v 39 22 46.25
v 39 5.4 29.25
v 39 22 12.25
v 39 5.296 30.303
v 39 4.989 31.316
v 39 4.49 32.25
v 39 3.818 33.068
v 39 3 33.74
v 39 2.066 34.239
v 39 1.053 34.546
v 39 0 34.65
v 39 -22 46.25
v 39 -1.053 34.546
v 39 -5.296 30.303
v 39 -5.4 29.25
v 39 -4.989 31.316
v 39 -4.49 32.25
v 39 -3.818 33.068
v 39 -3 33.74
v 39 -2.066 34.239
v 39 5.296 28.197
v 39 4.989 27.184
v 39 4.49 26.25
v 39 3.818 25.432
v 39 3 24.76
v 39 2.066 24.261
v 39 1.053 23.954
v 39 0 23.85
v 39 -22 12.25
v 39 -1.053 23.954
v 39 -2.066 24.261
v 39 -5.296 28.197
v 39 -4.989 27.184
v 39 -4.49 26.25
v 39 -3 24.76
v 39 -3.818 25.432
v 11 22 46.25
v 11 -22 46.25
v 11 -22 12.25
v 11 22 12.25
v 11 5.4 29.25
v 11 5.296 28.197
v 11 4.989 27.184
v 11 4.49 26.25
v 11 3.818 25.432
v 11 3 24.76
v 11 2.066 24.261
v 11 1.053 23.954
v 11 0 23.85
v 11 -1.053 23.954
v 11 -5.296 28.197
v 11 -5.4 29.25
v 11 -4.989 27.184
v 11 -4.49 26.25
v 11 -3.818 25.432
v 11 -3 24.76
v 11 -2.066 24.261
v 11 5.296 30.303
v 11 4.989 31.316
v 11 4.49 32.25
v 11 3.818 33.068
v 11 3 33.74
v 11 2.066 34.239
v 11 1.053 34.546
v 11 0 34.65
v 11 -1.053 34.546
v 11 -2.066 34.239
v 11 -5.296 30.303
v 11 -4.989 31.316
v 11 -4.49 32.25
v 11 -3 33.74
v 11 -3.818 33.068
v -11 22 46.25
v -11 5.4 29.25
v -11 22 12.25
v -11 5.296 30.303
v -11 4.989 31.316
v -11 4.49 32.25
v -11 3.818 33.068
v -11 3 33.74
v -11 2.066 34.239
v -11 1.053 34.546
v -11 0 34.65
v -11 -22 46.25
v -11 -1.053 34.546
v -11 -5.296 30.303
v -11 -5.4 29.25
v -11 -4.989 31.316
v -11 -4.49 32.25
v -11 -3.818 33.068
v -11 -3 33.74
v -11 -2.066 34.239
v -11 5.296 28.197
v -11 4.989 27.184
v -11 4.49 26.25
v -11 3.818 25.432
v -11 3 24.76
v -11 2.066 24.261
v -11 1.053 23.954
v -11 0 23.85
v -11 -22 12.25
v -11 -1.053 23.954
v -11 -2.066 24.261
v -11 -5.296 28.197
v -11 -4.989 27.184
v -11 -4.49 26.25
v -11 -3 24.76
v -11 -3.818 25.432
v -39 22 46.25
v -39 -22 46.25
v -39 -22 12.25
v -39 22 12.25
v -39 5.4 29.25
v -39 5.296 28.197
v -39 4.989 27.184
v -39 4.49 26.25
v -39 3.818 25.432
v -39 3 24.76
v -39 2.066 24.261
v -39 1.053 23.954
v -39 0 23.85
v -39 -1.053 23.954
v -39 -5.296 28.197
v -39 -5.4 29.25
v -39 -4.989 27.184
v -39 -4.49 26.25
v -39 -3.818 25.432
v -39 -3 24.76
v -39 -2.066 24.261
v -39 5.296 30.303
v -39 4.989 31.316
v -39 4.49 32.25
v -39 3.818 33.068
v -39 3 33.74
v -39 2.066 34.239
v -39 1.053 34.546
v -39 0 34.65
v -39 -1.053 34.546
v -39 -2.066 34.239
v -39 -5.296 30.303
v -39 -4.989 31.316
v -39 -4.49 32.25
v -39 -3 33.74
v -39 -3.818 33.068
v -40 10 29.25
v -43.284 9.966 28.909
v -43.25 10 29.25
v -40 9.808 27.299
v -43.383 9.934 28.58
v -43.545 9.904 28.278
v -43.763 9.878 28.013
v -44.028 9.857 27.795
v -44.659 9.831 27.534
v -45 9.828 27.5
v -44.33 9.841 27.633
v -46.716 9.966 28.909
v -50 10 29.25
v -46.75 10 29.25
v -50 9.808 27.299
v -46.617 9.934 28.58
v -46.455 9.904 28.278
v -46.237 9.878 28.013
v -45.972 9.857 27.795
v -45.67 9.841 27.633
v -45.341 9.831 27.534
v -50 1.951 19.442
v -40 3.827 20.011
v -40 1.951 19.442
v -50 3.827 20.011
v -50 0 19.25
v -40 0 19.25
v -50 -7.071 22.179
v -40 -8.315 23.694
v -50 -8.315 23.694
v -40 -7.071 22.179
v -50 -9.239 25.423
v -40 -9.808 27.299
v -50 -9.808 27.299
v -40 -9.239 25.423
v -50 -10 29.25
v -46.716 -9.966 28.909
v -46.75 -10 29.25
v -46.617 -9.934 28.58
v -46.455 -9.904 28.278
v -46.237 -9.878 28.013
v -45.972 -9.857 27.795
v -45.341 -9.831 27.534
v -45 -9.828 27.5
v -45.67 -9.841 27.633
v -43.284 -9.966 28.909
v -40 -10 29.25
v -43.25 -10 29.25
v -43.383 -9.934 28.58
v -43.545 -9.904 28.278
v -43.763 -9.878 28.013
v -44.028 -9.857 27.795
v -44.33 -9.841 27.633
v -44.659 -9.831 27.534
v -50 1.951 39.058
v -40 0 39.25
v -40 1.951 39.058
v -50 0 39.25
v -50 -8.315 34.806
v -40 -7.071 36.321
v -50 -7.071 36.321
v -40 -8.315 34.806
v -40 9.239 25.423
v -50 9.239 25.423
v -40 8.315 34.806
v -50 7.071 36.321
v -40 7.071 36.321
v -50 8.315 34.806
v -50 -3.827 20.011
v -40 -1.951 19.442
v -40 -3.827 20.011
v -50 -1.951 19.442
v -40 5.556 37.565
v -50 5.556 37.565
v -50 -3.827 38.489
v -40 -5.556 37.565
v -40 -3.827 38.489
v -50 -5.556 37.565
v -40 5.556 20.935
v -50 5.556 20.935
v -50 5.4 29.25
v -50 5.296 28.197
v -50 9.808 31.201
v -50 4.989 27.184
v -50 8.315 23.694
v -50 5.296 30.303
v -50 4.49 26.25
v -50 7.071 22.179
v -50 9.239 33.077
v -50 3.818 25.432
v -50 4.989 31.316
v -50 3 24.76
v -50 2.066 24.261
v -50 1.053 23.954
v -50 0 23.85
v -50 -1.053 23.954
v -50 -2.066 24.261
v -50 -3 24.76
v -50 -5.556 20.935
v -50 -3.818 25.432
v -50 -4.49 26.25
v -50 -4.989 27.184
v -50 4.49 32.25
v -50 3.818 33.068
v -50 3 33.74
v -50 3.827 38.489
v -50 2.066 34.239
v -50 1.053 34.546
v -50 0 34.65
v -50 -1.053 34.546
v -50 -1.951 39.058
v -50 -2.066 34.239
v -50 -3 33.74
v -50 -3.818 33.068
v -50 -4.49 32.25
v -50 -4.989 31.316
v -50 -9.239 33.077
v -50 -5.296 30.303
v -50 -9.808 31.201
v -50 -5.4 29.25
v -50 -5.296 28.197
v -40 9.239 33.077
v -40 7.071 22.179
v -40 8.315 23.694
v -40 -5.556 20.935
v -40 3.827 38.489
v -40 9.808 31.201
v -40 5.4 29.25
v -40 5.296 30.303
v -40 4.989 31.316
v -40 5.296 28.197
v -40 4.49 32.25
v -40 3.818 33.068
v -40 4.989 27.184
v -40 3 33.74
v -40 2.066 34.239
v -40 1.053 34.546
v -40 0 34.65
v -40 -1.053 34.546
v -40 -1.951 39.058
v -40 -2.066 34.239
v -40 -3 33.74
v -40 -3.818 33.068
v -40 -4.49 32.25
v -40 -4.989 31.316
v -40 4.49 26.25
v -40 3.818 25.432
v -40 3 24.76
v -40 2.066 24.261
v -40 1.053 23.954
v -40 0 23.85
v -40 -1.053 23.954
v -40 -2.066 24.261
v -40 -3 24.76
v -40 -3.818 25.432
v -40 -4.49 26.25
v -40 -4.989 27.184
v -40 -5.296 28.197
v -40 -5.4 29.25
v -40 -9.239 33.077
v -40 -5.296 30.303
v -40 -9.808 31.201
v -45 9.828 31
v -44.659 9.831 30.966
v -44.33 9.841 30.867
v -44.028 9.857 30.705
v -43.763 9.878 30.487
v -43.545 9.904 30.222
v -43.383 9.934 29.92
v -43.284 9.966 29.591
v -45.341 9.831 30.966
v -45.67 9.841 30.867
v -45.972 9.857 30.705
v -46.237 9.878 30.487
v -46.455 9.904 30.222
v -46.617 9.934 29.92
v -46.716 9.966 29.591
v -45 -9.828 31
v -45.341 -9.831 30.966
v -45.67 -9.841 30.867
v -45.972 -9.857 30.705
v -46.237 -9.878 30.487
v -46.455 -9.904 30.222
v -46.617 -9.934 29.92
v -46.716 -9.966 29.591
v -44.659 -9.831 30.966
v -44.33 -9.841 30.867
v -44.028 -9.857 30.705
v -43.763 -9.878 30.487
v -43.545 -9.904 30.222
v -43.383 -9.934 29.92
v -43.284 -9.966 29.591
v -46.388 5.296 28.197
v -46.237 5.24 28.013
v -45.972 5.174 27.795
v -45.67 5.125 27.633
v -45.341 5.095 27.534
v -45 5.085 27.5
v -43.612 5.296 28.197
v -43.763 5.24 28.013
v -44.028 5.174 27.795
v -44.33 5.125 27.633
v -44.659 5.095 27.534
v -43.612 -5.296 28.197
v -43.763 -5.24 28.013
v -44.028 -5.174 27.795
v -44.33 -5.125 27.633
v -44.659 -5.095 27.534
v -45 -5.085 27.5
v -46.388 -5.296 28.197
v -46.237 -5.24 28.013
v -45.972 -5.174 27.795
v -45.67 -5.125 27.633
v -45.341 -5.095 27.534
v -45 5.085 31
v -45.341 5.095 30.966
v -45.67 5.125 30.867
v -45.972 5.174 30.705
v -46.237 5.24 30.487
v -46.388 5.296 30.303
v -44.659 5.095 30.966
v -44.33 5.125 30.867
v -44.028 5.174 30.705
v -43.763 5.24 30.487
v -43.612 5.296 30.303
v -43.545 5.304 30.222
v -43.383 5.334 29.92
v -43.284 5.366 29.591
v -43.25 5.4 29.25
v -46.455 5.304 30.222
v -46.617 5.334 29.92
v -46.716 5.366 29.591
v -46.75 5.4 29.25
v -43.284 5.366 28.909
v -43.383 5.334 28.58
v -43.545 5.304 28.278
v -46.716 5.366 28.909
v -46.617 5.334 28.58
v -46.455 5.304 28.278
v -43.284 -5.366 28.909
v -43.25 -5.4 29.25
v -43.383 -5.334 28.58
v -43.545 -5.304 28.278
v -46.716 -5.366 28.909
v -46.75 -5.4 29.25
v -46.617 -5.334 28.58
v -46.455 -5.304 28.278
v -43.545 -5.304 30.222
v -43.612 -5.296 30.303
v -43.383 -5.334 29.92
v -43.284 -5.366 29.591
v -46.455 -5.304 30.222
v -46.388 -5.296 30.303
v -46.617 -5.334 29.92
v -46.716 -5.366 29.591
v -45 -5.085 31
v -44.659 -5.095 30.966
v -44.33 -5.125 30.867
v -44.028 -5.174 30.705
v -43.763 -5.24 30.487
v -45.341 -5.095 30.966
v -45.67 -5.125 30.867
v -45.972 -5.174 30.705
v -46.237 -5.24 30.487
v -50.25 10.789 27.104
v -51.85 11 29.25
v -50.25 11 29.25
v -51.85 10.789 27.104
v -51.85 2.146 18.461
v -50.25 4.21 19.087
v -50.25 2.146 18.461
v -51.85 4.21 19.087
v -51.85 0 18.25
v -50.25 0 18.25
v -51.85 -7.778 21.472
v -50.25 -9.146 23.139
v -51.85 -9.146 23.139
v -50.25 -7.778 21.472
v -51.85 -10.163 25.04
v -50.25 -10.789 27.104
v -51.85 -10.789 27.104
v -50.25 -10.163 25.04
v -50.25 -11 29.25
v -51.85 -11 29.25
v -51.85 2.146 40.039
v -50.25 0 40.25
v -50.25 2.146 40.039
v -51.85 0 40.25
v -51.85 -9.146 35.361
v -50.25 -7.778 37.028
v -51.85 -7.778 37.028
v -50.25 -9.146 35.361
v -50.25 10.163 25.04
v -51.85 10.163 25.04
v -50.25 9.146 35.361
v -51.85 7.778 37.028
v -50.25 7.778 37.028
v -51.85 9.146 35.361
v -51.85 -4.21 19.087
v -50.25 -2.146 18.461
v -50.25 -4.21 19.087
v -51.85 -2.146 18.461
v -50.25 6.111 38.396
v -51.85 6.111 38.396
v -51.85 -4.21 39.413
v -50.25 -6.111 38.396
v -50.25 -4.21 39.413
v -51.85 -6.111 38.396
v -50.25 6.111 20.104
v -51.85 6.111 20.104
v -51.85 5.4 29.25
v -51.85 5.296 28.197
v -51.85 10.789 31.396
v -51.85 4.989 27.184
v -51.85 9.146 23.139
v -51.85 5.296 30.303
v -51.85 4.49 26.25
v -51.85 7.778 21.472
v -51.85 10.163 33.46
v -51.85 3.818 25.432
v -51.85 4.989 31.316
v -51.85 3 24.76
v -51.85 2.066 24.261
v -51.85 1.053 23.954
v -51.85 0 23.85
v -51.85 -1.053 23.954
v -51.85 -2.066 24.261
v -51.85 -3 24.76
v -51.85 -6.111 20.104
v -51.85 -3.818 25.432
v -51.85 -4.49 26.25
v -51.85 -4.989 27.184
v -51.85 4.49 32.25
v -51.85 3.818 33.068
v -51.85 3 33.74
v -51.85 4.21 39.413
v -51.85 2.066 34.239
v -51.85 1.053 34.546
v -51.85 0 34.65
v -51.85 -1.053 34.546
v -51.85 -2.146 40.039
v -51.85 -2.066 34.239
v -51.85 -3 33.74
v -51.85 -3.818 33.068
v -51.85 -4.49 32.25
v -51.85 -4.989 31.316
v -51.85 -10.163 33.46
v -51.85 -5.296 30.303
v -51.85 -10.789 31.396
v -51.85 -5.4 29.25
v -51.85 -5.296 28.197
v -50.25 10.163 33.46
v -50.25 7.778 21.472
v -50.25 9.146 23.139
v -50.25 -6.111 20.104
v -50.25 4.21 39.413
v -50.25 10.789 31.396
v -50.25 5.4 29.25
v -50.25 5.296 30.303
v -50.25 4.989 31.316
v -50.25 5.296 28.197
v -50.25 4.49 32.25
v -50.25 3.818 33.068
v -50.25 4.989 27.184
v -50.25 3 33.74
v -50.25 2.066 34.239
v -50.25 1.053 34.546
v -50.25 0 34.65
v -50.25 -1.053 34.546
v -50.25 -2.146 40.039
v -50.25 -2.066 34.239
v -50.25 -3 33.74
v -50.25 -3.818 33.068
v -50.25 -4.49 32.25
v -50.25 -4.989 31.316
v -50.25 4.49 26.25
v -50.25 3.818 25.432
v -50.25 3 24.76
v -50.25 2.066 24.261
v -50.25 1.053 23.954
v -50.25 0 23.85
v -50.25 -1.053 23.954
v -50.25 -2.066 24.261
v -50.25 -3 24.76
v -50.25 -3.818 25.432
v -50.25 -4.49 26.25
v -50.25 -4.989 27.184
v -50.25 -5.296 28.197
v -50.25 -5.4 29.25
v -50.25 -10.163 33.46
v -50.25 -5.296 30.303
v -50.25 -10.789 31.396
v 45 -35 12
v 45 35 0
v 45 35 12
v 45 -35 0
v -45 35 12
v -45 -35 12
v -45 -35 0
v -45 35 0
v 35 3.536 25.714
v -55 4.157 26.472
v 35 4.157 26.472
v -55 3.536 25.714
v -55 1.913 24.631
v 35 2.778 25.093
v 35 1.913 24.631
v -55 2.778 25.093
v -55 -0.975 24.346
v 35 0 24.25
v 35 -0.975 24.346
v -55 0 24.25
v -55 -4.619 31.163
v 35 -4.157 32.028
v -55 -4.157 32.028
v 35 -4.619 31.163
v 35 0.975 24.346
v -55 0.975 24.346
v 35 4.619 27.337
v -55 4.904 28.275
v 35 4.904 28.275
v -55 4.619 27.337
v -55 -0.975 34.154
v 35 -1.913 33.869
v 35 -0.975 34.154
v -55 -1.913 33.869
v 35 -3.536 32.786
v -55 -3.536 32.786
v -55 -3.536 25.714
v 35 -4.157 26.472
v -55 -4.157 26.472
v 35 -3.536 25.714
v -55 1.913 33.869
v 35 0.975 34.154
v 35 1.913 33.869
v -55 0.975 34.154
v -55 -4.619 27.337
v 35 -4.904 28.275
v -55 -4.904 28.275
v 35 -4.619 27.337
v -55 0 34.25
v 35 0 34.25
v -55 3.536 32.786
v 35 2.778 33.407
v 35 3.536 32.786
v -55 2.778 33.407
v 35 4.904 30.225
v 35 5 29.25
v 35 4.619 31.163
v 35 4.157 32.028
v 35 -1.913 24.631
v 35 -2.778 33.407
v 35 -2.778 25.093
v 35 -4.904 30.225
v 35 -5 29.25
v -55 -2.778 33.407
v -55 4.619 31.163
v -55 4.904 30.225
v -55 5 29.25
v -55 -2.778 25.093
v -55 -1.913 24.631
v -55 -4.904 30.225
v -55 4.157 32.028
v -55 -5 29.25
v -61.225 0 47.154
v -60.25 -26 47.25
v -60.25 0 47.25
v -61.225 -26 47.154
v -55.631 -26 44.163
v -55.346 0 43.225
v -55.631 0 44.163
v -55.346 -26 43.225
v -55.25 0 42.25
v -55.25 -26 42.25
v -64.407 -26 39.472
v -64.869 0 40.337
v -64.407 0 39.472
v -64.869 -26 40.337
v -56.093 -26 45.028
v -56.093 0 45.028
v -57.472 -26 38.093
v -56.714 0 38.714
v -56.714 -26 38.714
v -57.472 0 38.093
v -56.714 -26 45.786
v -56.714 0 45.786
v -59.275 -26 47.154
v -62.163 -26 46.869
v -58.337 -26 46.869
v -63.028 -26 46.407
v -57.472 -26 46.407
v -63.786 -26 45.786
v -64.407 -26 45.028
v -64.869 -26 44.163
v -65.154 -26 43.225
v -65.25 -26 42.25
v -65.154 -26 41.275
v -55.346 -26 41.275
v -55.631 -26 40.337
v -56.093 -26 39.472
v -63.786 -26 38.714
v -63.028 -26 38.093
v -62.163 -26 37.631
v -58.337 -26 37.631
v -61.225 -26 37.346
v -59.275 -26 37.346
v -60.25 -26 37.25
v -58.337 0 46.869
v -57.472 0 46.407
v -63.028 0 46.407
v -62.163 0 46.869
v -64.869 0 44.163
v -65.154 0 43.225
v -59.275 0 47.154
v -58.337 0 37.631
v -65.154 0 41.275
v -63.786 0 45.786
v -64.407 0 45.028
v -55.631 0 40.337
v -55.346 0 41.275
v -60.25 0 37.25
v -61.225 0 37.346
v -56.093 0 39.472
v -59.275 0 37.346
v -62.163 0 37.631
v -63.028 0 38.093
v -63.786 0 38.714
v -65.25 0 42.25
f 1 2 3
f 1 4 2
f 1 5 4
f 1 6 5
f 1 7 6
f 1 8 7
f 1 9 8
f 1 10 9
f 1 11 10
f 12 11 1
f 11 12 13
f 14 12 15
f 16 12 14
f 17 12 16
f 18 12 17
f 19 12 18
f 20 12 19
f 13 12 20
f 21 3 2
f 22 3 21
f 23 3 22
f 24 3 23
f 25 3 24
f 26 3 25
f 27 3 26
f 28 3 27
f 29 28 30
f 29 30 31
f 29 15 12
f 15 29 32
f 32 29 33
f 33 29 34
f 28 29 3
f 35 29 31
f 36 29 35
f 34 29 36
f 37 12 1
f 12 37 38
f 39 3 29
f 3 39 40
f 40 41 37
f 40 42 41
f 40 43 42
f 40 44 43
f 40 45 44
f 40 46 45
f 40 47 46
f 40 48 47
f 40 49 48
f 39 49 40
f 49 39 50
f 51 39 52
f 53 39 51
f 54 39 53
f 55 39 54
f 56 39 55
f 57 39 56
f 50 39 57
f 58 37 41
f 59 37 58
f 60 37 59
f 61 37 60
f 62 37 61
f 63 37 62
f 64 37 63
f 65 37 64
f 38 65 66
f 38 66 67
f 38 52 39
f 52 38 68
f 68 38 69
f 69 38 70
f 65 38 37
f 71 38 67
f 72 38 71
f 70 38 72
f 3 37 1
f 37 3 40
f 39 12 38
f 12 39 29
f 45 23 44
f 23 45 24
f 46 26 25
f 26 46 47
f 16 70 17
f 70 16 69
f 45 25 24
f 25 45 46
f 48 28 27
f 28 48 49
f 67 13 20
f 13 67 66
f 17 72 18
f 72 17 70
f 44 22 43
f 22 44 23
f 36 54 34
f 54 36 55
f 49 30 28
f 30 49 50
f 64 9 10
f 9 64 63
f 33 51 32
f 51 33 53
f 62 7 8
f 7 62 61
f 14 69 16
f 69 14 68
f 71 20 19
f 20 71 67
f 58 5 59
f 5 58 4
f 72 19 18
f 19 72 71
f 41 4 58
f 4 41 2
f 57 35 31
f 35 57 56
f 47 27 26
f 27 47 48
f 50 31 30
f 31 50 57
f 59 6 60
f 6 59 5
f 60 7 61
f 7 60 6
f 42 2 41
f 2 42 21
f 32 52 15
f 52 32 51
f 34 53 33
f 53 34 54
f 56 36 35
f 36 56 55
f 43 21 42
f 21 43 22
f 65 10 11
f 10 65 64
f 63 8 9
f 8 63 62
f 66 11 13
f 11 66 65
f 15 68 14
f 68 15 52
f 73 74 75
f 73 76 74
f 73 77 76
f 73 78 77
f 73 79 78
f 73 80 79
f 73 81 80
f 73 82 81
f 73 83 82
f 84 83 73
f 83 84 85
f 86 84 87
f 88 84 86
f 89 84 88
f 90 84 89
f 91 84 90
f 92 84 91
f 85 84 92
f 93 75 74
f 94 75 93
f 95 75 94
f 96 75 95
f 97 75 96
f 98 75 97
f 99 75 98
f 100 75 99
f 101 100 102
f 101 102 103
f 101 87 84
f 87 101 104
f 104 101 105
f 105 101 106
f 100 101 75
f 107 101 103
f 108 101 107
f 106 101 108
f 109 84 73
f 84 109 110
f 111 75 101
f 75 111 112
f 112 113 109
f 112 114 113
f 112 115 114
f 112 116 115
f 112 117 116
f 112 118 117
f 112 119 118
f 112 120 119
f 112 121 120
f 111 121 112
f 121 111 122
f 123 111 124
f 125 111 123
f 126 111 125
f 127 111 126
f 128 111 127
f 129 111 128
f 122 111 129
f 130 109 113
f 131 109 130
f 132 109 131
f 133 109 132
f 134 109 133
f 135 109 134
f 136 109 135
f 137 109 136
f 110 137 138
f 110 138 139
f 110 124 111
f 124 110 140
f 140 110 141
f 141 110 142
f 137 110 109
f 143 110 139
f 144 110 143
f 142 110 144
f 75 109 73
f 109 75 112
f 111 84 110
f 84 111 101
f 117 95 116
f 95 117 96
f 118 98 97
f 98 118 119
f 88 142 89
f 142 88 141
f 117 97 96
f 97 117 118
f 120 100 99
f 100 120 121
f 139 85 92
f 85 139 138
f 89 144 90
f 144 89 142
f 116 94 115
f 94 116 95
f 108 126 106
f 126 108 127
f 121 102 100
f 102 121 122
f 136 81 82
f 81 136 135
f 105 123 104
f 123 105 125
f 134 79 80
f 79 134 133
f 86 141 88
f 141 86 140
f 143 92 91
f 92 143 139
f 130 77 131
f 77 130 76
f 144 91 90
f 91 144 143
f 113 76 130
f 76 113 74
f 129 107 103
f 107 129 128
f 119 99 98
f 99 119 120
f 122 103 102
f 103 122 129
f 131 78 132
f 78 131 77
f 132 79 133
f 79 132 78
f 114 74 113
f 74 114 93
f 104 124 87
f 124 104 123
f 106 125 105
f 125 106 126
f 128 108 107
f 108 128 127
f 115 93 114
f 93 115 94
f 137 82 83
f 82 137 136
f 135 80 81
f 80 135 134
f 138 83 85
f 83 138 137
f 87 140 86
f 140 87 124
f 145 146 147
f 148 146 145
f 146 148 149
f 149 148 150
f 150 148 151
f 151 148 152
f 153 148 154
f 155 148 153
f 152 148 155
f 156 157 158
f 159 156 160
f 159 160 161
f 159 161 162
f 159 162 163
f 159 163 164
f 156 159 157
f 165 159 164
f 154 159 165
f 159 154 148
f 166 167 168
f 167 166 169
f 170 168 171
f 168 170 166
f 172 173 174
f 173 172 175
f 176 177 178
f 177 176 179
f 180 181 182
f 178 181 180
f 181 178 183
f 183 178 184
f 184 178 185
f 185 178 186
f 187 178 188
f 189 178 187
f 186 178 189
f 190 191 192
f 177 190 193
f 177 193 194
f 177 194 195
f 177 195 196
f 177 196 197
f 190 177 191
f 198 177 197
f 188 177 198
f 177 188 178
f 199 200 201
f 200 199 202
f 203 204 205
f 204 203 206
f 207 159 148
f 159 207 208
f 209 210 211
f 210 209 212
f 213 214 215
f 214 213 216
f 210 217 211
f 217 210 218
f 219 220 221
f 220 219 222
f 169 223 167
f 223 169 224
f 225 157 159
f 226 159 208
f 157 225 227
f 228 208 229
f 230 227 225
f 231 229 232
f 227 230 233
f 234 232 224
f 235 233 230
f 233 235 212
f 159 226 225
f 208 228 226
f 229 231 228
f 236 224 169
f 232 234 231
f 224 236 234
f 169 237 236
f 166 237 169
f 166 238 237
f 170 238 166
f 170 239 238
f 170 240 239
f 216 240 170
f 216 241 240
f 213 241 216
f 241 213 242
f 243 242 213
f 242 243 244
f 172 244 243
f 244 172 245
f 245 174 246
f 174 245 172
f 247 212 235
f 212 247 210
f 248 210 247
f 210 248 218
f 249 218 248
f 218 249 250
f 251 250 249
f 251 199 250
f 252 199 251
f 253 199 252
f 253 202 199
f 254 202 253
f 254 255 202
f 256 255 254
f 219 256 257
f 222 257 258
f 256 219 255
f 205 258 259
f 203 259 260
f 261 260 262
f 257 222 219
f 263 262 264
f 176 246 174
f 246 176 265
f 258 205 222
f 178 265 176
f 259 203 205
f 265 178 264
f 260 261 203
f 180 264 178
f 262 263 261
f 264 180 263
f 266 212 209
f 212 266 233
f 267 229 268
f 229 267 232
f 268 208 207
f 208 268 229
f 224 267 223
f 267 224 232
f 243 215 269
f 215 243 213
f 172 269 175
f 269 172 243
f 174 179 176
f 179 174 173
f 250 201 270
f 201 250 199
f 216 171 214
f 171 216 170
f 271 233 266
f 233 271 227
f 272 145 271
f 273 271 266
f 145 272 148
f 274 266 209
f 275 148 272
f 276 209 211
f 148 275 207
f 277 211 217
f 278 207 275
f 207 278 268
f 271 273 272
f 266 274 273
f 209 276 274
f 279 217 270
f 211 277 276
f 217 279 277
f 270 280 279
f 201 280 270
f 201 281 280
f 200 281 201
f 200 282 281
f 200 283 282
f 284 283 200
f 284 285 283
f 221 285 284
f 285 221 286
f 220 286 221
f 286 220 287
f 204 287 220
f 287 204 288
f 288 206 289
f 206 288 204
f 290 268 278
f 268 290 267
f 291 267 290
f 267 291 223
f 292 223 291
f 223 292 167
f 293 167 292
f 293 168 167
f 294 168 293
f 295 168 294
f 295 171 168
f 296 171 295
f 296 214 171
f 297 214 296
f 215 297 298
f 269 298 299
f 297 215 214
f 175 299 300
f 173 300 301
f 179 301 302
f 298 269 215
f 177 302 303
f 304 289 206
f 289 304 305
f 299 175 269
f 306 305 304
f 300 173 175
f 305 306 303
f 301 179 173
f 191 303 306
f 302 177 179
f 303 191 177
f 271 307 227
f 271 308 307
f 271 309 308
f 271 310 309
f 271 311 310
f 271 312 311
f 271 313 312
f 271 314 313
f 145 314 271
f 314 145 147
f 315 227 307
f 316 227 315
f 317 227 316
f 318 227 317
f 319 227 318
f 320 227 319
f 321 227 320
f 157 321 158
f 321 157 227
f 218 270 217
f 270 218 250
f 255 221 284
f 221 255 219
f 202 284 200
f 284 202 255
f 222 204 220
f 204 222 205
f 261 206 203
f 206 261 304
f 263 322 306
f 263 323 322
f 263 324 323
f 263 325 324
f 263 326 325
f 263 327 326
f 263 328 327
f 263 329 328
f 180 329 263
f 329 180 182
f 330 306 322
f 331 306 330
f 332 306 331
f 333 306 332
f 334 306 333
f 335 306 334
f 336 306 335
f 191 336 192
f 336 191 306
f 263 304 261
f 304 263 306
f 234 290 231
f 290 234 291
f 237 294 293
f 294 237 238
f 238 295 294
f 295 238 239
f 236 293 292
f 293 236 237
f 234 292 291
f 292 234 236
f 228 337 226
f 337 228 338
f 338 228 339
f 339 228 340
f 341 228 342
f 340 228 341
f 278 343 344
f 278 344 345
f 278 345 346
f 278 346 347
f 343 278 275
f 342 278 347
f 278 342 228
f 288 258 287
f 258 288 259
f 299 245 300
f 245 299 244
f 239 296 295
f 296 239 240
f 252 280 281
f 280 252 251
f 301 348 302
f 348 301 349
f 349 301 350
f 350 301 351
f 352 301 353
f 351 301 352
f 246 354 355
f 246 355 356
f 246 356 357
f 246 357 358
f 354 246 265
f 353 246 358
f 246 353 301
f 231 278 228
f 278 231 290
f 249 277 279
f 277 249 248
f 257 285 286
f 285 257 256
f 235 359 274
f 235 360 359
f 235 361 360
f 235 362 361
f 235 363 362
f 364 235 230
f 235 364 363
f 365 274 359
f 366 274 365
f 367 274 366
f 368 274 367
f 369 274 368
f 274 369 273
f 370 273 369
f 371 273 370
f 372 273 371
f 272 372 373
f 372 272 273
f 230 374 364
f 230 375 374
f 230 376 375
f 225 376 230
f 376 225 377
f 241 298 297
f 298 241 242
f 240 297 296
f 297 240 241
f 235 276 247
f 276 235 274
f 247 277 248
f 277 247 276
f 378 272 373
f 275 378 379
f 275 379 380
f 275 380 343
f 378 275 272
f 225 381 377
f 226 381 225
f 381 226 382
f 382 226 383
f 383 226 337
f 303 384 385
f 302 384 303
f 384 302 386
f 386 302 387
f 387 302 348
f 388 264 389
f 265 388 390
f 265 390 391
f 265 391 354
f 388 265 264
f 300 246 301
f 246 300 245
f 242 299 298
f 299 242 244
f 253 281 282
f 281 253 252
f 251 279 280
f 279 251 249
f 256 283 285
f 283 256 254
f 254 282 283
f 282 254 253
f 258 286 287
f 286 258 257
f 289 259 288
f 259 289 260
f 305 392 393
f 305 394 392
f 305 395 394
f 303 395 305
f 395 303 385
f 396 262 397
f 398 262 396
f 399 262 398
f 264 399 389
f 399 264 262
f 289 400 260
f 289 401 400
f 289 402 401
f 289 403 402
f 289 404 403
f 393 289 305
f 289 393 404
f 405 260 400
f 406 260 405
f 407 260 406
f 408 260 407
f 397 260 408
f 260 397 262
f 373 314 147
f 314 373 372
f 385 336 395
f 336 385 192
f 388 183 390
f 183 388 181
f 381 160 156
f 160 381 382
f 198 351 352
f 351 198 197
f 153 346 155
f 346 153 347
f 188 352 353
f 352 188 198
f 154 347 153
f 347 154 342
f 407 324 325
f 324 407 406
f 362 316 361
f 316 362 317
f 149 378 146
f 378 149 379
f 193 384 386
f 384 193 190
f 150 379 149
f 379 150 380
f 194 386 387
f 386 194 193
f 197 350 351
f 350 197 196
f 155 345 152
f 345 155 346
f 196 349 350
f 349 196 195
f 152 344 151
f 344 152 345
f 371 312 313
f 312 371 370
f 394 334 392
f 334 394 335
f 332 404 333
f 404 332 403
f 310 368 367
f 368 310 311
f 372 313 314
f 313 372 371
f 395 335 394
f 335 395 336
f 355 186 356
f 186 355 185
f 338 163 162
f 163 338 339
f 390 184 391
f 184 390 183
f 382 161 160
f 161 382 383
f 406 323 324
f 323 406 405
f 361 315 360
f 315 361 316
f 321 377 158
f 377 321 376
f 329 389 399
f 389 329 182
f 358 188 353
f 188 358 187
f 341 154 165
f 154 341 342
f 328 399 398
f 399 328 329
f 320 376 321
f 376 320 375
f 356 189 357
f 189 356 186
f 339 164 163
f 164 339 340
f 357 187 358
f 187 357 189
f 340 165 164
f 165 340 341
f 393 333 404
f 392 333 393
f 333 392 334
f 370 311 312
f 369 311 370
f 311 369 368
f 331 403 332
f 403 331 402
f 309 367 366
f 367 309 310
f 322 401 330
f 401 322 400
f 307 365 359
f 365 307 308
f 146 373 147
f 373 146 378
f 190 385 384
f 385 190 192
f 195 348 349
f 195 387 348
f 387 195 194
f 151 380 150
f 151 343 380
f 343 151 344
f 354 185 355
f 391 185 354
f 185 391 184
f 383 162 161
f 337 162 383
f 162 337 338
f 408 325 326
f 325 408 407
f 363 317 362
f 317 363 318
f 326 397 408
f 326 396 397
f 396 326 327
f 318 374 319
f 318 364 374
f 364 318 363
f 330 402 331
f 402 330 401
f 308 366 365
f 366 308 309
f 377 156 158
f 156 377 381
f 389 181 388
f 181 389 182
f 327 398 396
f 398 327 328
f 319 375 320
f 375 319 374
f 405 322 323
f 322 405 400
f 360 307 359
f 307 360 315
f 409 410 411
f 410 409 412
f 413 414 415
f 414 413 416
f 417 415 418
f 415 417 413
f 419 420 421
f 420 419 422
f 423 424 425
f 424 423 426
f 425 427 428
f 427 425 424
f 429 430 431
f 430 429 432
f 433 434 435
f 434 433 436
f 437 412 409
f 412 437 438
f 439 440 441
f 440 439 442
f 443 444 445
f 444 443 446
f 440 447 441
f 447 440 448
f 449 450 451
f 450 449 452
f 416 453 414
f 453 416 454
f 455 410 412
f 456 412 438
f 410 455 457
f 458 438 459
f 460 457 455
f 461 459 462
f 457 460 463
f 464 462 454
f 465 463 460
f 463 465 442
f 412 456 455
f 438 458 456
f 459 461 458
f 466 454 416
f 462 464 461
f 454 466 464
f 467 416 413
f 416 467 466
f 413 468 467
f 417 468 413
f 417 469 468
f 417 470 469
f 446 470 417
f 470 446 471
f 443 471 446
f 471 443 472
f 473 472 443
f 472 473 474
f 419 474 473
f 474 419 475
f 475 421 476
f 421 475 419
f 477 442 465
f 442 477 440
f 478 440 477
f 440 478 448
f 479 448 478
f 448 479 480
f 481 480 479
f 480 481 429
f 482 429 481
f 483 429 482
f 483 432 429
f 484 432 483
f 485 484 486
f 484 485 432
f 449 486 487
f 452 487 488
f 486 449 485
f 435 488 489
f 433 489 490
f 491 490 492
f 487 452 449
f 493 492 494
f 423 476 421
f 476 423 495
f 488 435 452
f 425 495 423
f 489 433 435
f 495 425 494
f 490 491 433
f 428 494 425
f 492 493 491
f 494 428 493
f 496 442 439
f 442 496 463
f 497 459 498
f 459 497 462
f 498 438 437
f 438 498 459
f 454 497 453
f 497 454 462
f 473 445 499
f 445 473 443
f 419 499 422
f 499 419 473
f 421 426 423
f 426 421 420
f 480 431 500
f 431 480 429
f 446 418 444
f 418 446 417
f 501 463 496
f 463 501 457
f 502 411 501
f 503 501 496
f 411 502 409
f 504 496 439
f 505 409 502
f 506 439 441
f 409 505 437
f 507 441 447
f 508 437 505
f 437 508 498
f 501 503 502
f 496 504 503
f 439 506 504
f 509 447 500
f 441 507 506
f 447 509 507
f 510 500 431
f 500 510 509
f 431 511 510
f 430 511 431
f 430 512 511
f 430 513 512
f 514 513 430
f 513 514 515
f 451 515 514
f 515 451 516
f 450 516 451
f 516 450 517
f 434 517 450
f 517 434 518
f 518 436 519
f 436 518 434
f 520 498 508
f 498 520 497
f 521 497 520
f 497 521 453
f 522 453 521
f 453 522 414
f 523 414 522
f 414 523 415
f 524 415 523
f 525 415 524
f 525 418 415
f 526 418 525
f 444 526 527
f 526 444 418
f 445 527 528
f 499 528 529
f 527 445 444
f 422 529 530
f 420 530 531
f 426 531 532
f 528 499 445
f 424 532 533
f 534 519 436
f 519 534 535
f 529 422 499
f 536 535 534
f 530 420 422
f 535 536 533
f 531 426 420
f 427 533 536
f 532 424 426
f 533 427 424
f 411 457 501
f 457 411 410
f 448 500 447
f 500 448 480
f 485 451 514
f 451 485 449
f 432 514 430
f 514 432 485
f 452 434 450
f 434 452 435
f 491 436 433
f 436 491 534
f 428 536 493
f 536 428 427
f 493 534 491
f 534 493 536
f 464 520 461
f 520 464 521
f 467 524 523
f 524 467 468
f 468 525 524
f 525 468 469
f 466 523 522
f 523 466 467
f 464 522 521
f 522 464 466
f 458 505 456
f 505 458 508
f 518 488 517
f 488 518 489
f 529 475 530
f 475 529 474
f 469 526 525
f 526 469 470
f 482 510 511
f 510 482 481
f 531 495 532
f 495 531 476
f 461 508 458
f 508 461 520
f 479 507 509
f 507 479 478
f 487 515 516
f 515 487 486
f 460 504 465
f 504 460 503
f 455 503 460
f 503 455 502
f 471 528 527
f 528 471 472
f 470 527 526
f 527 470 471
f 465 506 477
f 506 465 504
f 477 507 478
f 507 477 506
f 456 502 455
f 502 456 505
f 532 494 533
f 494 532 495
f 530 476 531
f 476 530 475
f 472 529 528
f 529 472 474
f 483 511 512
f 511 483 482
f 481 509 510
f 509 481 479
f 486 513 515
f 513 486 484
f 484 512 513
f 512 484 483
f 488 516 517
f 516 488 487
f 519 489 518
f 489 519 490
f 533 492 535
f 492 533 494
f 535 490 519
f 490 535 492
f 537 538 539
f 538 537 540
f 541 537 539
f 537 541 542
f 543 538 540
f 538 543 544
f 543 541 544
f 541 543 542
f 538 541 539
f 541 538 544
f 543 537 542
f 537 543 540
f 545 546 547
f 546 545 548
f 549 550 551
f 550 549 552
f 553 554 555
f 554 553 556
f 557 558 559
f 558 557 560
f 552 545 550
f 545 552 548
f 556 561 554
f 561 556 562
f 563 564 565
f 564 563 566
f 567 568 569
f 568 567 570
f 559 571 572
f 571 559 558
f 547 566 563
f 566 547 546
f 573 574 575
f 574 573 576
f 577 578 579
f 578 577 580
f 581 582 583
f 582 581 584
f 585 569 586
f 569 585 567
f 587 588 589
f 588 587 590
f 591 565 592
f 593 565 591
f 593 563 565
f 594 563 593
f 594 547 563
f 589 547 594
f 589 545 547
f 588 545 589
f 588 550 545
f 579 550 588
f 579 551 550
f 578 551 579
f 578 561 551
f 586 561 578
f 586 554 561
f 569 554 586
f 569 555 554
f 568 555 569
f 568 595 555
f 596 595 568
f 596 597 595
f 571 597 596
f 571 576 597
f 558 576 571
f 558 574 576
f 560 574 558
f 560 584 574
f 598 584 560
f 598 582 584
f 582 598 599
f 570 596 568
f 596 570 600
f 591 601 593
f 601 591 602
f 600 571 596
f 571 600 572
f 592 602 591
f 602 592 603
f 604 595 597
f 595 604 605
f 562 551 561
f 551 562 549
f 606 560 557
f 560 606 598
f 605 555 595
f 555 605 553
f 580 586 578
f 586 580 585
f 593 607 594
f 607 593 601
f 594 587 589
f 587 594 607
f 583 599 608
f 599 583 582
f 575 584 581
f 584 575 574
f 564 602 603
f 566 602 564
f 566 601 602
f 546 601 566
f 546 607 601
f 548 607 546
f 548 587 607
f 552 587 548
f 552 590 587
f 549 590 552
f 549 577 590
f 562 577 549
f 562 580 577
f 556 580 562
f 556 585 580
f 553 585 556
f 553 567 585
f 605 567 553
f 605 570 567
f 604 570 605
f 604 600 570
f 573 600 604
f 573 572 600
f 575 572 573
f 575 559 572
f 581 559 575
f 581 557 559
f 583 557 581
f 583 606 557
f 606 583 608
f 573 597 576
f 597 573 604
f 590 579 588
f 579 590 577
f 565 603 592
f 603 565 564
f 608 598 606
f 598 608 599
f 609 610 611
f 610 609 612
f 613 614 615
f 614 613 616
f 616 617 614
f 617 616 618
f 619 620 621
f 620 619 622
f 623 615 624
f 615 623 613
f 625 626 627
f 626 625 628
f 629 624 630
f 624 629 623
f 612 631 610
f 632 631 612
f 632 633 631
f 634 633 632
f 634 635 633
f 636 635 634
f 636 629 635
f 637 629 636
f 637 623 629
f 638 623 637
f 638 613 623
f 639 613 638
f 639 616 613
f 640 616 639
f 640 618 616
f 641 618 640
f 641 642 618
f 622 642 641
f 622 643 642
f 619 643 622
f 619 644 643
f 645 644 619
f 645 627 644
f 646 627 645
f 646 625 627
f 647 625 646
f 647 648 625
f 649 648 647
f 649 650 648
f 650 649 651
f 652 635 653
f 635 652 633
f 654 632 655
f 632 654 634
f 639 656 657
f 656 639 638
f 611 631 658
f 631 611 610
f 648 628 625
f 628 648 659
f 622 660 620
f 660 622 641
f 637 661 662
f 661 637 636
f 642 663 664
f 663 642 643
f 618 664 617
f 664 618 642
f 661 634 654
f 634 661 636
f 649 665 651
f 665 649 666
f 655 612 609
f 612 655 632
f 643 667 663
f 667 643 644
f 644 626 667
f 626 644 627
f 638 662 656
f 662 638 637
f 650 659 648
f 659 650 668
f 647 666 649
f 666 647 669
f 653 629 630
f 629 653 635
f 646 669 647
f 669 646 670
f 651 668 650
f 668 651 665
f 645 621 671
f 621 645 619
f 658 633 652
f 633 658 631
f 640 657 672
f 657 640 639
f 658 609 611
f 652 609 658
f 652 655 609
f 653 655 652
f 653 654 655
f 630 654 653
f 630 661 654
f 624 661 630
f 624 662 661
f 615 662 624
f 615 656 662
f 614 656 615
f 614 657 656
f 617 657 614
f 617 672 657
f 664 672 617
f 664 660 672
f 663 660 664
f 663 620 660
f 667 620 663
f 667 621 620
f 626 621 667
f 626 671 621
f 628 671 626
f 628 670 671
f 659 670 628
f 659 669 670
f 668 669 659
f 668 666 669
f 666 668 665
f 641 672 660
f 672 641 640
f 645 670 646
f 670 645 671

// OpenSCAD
$fn = 32;

// ------------------------------------------------------------------------
// Machine vise: screw d10, jaws 28 x 34 mm
// Every part is its own module, assembly() places every instance.
// ------------------------------------------------------------------------

// --- part 1 ---
module vise_bed() {
  difference() {
    translate([-45, -35, 0]) cube([90, 70, 12]);
  }
}

// --- part 2 ---
module vise_jaw() {
  difference() {
    translate([-14, -22, 0]) cube([28, 44, 34]);
    translate([0, 0, 17]) rotate([0, 90, 0]) cylinder(h = 30, d = 10.8, center = true);
  }
}

// --- part 3 ---
module vise_screw() {
  translate([0, 0, -45]) cylinder(h = 90, d = 10);
}

// --- part 4 ---
module screw_collar() {
  difference() {
    cylinder(h = 10, d = 20);
    translate([0, 0, -1]) cylinder(h = 12, d = 10.8);
    translate([0, 0, 5]) rotate([90, 0, 0]) cylinder(h = 22, d = 3.5, center = true);
  }
}

// --- part 5 ---
module screw_washer() {
  difference() {
      translate([0, 0, 0]) cylinder(h = 1.6, d = 22);
      translate([0, 0, -1]) cylinder(h = 3.6, d = 10.8);
    }
}

// --- part 6 ---
module vise_handle() {
  cylinder(h = 26, d = 10);
}

// --- assembly ---
module assembly() {
  color([0.80, 0.24, 0.20]) translate([0, 0, 0]) rotate([0, 0, 0]) vise_bed();
  color([0.20, 0.45, 0.75]) translate([25, 0, 12.25]) rotate([0, 0, 0]) vise_jaw();
  color([0.25, 0.62, 0.32]) translate([-25, 0, 12.25]) rotate([0, 0, 0]) vise_jaw();
  color([0.92, 0.70, 0.18]) translate([-10, 0, 29.25]) rotate([0, 90, 0]) vise_screw();
  color([0.58, 0.35, 0.70]) translate([-50, 0, 29.25]) rotate([0, 90, 0]) screw_collar();
  color([0.16, 0.66, 0.66]) translate([-51.85, 0, 29.25]) rotate([0, 90, 0]) screw_washer();
  color([0.85, 0.48, 0.18]) translate([-60.25, 0, 42.25]) rotate([90, 0, 0]) vise_handle();
}

assembly();
